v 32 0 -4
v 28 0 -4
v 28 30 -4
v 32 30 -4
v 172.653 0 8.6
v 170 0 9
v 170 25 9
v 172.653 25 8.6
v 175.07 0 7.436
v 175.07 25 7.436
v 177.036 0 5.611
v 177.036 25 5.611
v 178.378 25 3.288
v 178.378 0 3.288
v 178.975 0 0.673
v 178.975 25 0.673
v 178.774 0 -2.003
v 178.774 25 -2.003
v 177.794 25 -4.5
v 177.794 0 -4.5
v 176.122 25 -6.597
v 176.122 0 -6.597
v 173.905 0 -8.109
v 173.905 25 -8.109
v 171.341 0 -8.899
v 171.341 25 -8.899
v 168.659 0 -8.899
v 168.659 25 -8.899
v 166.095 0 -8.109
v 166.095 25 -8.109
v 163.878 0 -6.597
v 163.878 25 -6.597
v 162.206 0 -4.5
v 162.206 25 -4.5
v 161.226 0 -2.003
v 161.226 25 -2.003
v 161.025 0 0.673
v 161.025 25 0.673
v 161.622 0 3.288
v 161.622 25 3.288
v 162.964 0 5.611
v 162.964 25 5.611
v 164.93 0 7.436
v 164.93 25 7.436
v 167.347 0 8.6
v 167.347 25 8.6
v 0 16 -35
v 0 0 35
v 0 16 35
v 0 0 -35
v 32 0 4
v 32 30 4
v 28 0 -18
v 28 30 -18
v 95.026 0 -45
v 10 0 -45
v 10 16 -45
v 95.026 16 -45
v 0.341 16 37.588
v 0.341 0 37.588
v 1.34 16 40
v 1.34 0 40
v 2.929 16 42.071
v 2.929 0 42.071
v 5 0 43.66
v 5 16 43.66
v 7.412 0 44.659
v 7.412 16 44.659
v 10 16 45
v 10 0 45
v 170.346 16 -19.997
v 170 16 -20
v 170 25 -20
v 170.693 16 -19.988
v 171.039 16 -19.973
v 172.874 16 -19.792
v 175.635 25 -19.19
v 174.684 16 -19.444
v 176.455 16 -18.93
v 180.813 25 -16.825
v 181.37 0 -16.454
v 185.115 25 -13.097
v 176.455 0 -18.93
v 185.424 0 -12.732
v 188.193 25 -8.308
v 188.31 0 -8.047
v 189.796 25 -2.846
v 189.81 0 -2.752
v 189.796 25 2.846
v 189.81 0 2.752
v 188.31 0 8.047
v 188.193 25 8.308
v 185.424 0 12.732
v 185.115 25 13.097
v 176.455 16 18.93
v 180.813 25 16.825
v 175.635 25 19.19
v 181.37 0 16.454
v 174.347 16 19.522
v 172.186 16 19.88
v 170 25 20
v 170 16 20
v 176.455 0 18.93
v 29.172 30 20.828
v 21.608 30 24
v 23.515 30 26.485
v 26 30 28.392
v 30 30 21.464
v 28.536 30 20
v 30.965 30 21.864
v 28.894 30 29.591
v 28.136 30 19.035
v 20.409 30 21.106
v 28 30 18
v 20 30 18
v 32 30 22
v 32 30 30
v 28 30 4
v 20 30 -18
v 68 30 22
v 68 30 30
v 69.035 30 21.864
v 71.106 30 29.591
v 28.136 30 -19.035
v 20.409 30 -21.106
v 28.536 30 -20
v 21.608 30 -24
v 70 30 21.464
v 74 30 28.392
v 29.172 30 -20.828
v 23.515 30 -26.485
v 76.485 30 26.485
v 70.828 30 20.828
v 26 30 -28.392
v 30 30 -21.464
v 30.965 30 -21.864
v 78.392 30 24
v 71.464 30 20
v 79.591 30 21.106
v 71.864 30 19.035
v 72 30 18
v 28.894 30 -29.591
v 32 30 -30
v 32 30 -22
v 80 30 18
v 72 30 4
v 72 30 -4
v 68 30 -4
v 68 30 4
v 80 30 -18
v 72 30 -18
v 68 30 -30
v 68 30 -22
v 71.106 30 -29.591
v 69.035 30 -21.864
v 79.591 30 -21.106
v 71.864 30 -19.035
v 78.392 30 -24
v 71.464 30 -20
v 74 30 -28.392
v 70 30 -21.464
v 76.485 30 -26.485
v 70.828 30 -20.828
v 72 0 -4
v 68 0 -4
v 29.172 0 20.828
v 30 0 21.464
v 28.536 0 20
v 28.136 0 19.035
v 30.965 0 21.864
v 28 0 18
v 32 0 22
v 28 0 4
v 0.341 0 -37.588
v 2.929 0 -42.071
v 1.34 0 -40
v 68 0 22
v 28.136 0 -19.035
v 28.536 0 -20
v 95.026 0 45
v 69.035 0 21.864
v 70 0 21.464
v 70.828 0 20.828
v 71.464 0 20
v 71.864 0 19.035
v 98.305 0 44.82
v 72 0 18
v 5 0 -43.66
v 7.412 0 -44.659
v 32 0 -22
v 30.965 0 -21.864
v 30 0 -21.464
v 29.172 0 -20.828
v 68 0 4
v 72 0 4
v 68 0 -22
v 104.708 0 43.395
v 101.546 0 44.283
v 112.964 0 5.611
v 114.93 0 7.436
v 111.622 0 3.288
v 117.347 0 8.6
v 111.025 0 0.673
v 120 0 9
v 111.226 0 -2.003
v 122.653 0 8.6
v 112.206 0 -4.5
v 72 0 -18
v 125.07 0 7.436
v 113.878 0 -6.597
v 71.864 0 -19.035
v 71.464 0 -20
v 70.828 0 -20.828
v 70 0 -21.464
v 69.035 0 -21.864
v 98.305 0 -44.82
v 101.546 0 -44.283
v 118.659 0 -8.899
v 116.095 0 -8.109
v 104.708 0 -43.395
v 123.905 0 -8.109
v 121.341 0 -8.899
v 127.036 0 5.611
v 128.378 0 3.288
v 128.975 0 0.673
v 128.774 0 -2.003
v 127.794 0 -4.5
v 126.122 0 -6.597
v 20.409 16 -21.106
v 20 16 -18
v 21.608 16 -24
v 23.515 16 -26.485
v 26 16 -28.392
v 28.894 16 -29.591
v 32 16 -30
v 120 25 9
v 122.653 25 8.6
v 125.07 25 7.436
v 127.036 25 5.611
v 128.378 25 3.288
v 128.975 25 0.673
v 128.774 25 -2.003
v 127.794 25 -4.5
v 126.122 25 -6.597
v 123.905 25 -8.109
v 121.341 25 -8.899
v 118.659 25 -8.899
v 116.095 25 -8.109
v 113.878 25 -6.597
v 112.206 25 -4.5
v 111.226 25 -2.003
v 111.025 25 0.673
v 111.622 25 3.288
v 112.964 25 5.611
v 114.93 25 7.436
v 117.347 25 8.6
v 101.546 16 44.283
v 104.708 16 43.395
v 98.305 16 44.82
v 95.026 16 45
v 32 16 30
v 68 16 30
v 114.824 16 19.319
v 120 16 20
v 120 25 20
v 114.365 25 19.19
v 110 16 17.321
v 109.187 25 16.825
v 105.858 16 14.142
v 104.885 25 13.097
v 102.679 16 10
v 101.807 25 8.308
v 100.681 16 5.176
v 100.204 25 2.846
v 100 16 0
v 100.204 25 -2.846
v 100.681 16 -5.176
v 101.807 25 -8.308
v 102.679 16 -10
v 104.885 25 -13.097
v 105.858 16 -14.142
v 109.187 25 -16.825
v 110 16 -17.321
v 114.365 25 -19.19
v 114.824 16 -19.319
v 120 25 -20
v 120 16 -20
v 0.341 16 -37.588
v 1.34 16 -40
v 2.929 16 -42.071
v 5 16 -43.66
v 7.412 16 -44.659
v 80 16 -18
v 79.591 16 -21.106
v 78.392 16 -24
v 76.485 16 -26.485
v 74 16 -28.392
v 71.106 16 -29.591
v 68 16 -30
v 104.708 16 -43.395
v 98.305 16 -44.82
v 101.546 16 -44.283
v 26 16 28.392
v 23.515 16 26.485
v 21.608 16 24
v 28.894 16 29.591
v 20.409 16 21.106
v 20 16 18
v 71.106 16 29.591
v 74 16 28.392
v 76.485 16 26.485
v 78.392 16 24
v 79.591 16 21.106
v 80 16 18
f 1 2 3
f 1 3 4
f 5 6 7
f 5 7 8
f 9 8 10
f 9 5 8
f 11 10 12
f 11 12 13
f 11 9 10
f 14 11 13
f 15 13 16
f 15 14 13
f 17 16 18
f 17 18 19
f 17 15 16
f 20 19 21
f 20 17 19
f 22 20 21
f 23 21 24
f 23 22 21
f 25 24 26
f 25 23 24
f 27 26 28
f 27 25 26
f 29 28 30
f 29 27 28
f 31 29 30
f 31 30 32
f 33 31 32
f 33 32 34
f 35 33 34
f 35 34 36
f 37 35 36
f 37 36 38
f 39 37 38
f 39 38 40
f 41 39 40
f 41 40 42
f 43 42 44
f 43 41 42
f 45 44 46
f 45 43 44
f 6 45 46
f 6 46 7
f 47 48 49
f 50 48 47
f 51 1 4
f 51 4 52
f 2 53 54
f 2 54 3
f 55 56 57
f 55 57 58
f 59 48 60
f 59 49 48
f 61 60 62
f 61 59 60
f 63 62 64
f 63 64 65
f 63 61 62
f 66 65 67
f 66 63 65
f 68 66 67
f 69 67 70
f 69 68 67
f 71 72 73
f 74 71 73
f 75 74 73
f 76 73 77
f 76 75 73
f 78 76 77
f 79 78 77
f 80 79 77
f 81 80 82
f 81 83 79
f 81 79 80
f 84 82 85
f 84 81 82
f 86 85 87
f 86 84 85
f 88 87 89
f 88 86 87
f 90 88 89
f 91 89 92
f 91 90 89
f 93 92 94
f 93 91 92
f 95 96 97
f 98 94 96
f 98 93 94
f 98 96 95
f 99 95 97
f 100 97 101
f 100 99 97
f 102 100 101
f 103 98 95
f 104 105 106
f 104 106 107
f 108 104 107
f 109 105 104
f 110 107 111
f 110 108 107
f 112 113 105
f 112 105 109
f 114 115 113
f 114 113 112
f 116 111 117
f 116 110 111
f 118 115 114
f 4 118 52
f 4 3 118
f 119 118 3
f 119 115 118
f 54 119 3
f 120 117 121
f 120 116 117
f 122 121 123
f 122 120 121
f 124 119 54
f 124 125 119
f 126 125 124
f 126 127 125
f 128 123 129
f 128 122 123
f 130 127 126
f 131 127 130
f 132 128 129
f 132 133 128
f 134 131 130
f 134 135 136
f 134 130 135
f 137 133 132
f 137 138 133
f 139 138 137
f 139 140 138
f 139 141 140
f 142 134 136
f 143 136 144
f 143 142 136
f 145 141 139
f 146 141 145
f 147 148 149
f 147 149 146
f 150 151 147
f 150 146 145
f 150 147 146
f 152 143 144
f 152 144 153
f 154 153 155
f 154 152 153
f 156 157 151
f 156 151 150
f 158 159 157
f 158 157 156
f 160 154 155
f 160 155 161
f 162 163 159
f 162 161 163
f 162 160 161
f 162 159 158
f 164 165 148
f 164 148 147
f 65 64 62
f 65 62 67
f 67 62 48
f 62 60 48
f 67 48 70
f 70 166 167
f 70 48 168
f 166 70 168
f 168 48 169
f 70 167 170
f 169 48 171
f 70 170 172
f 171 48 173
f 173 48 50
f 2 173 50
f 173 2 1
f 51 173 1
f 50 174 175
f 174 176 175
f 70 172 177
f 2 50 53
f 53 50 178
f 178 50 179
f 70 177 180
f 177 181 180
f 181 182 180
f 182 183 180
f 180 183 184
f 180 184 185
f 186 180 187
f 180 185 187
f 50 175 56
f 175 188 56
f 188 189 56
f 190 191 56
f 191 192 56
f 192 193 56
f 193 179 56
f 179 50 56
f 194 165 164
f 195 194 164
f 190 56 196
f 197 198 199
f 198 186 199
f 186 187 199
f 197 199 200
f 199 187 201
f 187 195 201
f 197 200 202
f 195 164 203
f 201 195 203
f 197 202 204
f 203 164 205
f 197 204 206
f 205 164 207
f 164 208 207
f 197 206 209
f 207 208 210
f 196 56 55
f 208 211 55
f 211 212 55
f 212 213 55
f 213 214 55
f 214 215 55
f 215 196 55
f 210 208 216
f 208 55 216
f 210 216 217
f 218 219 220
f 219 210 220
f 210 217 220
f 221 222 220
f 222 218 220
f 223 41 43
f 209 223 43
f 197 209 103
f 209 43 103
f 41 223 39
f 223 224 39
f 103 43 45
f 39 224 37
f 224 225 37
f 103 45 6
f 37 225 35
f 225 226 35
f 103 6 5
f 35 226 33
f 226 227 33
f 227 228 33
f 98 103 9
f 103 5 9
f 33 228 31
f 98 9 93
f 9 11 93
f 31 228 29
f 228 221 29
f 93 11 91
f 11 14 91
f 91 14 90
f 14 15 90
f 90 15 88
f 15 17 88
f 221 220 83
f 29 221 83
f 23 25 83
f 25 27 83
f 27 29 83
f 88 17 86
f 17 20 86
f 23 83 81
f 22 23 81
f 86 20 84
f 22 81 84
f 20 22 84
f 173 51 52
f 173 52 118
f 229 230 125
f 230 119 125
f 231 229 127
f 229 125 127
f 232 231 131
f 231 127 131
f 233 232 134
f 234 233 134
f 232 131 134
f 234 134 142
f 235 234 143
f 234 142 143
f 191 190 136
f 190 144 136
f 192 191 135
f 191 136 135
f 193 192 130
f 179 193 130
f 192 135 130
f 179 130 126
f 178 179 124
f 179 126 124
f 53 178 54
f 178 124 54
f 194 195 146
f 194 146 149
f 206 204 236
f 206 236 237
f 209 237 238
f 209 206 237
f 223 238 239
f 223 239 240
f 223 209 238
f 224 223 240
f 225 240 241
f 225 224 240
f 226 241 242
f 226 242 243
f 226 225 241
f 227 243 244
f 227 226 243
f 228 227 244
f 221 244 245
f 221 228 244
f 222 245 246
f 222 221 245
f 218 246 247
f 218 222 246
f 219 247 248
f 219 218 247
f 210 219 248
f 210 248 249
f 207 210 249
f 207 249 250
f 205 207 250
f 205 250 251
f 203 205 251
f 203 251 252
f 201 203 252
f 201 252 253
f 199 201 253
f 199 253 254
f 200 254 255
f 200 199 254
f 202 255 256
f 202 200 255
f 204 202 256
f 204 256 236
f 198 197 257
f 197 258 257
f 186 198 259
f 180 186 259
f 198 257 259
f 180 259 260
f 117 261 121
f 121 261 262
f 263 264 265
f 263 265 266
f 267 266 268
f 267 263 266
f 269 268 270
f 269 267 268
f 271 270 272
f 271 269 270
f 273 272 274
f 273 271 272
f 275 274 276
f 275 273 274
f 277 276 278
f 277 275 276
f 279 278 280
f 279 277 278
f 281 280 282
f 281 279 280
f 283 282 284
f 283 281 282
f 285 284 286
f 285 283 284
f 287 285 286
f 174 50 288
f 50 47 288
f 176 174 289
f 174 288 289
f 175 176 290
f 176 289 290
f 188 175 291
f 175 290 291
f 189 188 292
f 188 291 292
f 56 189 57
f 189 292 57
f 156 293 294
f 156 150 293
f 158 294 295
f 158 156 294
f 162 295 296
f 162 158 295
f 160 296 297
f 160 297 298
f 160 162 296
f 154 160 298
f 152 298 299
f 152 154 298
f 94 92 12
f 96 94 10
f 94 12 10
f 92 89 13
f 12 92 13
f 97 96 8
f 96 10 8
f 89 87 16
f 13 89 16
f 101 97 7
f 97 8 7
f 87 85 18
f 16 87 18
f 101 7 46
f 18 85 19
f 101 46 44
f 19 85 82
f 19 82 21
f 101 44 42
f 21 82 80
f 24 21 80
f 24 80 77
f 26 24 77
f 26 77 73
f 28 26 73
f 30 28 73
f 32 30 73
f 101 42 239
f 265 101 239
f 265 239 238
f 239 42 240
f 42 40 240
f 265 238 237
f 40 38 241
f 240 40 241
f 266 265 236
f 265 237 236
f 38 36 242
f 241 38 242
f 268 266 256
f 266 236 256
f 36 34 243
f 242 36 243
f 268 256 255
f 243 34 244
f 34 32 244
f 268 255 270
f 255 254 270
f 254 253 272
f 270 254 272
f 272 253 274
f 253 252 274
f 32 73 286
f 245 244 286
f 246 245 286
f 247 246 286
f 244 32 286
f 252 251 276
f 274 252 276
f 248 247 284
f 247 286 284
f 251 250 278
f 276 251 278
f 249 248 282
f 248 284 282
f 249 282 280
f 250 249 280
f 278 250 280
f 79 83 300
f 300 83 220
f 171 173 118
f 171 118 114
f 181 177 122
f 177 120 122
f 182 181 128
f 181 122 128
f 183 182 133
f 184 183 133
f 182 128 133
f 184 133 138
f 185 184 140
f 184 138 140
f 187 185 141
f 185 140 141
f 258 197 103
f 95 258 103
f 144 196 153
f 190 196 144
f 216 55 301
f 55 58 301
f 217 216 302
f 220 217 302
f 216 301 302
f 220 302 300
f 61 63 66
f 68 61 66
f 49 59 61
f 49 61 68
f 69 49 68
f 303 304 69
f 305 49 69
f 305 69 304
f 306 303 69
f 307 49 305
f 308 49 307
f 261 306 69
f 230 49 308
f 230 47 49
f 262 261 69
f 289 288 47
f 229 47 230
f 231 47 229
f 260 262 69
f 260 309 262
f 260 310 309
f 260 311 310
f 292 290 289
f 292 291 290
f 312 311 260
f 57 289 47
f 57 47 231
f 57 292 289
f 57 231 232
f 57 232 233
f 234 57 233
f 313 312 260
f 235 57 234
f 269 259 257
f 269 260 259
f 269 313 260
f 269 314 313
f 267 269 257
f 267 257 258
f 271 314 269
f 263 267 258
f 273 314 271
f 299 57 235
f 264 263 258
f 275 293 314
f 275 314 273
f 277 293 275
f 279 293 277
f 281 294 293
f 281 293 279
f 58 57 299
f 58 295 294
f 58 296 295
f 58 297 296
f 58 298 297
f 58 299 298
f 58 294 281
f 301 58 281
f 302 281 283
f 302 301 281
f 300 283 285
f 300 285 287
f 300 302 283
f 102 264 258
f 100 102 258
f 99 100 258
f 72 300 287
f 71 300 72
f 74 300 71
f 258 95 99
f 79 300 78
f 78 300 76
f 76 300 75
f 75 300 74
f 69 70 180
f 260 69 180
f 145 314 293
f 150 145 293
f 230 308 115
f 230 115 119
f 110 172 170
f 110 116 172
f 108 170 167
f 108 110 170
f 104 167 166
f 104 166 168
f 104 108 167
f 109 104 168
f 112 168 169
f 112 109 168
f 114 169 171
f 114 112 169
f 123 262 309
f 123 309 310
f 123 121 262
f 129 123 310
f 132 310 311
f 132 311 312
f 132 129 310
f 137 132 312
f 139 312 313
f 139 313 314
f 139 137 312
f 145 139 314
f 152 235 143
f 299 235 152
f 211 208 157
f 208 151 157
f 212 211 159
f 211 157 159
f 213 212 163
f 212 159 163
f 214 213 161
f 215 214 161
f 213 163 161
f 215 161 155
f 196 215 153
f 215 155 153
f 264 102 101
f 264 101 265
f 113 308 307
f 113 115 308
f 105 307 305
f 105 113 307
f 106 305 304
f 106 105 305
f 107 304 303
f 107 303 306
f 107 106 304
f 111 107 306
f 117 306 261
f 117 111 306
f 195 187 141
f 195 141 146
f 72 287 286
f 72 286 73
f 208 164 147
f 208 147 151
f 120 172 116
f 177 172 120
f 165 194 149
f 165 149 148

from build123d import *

# Parameters (mm, degrees)
SKETCH_1_W          = 100
SKETCH_1_H          = 90
EXTRUDE_1_DEPTH     = 16
FILLET_1_R          = 10
SKETCH_4_W          = 60
SKETCH_4_H          = 60
EXTRUDE_2_DEPTH     = 30
FILLET_3_R          = 12
CUT_EXTRUDE_1_DEPTH = 46
FILLET_4_R          = 4
EXTRUDE_4_DEPTH     = 16
SKETCH_10_R         = 9
EXTRUDE_5_DEPTH     = 25
FILLET_6_R          = 30


with BuildPart() as part:
    # 草图1 → 凸台-拉伸1 (new body)
    with BuildSketch(Plane(origin=(0, 0, 0), x_dir=(1, 0, 0), z_dir=(0, 1, 0))):
        with Locations((50, 0)):
            Rectangle(SKETCH_1_W, SKETCH_1_H)
    extrude(amount=EXTRUDE_1_DEPTH)

    # 圆角1
    fillet_1_edges = [part.edges().sort_by_distance(p)[0] for p in [
        (0, 8, -45),
        (0, 8, 45),
    ]]
    fillet(fillet_1_edges, radius=FILLET_1_R)

    # 草图4 → 凸台-拉伸2 (add)
    with BuildSketch(Plane(origin=(0, 0, 0), x_dir=(1, 0, 0), z_dir=(0, 1, 0))):
        with Locations((50, 0)):
            Rectangle(SKETCH_4_W, SKETCH_4_H)
    extrude(amount=EXTRUDE_2_DEPTH)

    # 圆角3
    fillet_3_edges = [part.edges().sort_by_distance(p)[0] for p in [
        (20, 23, -30),
        (20, 23, 30),
        (80, 23, 30),
        (80, 23, -30),
    ]]
    fillet(fillet_3_edges, radius=FILLET_3_R)

    # 草图5 → 切除-拉伸1 (cut)
    with BuildSketch(Plane(origin=(0, 0, 0), x_dir=(1, 0, 0), z_dir=(0, 1, 0))):
        Polygon((28, -4), (28, -22), (72, -22), (72, -4), (68, -4), (68, 4), (72, 4), (72, 22), (28, 22), (28, 4), (32, 4), (32, -4), align=None)
    extrude(amount=CUT_EXTRUDE_1_DEPTH, mode=Mode.SUBTRACT)

    # 圆角4
    fillet_4_edges = [part.edges().sort_by_distance(p)[0] for p in [
        (28, 15, -22),
        (28, 15, 22),
        (72, 15, 22),
        (72, 15, -22),
    ]]
    fillet(fillet_4_edges, radius=FILLET_4_R)

    # 草图9 → 凸台-拉伸4 (add)
    with BuildSketch(Plane(origin=(0, 0, 0), x_dir=(1, 0, 0), z_dir=(0, 1, 0))):
        with BuildLine():
            ThreePointArc((100, 1e-09), (105.857864376, 14.142135624), (120, 20))
            Line((120, 20), (168.98254652, 19.974102944))
            ThreePointArc((168.98254652, 19.974102944), (170.010573991, 19.999997205), (171.038573506, 19.973015923))
            ThreePointArc((171.038573506, 19.973015923), (173.782842055, 19.638994526), (176.45483392, 18.929741653))
            Line((176.45483392, 18.929741653), (100, 45))
            Line((100, 45), (100, 1e-09))
        make_face()
        with BuildLine():
            ThreePointArc((120, -20), (105.857864376, -14.142135623), (100, 1e-09))
            Line((100, 1e-09), (100, -45))
            Line((100, -45), (176.45483392, -18.929741653))
            ThreePointArc((176.45483392, -18.929741653), (173.271480317, -19.730621291), (170, -20))
            Line((170, -20), (120, -20))
        make_face()
    extrude(amount=EXTRUDE_4_DEPTH)

    # 草图10 → 凸台-拉伸5 (add)
    with BuildSketch(Plane(origin=(0, 0, 0), x_dir=(1, 0, 0), z_dir=(0, 1, 0))):
        with BuildLine():
            Line((120, 20), (170, 20))
            ThreePointArc((170, 20), (190, 0), (170, -20))
            Line((170, -20), (120, -20))
            ThreePointArc((120, -20), (100, 0), (120, 20))
        make_face()
        with Locations(Location((120, 0, 0), (0, 0, 270))):
            Circle(SKETCH_10_R, mode=Mode.SUBTRACT)
        with Locations(Location((170, 0, 0), (0, 0, 270))):
            Circle(SKETCH_10_R, mode=Mode.SUBTRACT)
    extrude(amount=EXTRUDE_5_DEPTH)

    # 圆角6
    fillet_6_edges = [part.edges().sort_by_distance(p)[0] for p in [
        (100, 8, -45),
        (100, 8, 45),
    ]]
    fillet(fillet_6_edges, radius=FILLET_6_R)


solid = part.part
